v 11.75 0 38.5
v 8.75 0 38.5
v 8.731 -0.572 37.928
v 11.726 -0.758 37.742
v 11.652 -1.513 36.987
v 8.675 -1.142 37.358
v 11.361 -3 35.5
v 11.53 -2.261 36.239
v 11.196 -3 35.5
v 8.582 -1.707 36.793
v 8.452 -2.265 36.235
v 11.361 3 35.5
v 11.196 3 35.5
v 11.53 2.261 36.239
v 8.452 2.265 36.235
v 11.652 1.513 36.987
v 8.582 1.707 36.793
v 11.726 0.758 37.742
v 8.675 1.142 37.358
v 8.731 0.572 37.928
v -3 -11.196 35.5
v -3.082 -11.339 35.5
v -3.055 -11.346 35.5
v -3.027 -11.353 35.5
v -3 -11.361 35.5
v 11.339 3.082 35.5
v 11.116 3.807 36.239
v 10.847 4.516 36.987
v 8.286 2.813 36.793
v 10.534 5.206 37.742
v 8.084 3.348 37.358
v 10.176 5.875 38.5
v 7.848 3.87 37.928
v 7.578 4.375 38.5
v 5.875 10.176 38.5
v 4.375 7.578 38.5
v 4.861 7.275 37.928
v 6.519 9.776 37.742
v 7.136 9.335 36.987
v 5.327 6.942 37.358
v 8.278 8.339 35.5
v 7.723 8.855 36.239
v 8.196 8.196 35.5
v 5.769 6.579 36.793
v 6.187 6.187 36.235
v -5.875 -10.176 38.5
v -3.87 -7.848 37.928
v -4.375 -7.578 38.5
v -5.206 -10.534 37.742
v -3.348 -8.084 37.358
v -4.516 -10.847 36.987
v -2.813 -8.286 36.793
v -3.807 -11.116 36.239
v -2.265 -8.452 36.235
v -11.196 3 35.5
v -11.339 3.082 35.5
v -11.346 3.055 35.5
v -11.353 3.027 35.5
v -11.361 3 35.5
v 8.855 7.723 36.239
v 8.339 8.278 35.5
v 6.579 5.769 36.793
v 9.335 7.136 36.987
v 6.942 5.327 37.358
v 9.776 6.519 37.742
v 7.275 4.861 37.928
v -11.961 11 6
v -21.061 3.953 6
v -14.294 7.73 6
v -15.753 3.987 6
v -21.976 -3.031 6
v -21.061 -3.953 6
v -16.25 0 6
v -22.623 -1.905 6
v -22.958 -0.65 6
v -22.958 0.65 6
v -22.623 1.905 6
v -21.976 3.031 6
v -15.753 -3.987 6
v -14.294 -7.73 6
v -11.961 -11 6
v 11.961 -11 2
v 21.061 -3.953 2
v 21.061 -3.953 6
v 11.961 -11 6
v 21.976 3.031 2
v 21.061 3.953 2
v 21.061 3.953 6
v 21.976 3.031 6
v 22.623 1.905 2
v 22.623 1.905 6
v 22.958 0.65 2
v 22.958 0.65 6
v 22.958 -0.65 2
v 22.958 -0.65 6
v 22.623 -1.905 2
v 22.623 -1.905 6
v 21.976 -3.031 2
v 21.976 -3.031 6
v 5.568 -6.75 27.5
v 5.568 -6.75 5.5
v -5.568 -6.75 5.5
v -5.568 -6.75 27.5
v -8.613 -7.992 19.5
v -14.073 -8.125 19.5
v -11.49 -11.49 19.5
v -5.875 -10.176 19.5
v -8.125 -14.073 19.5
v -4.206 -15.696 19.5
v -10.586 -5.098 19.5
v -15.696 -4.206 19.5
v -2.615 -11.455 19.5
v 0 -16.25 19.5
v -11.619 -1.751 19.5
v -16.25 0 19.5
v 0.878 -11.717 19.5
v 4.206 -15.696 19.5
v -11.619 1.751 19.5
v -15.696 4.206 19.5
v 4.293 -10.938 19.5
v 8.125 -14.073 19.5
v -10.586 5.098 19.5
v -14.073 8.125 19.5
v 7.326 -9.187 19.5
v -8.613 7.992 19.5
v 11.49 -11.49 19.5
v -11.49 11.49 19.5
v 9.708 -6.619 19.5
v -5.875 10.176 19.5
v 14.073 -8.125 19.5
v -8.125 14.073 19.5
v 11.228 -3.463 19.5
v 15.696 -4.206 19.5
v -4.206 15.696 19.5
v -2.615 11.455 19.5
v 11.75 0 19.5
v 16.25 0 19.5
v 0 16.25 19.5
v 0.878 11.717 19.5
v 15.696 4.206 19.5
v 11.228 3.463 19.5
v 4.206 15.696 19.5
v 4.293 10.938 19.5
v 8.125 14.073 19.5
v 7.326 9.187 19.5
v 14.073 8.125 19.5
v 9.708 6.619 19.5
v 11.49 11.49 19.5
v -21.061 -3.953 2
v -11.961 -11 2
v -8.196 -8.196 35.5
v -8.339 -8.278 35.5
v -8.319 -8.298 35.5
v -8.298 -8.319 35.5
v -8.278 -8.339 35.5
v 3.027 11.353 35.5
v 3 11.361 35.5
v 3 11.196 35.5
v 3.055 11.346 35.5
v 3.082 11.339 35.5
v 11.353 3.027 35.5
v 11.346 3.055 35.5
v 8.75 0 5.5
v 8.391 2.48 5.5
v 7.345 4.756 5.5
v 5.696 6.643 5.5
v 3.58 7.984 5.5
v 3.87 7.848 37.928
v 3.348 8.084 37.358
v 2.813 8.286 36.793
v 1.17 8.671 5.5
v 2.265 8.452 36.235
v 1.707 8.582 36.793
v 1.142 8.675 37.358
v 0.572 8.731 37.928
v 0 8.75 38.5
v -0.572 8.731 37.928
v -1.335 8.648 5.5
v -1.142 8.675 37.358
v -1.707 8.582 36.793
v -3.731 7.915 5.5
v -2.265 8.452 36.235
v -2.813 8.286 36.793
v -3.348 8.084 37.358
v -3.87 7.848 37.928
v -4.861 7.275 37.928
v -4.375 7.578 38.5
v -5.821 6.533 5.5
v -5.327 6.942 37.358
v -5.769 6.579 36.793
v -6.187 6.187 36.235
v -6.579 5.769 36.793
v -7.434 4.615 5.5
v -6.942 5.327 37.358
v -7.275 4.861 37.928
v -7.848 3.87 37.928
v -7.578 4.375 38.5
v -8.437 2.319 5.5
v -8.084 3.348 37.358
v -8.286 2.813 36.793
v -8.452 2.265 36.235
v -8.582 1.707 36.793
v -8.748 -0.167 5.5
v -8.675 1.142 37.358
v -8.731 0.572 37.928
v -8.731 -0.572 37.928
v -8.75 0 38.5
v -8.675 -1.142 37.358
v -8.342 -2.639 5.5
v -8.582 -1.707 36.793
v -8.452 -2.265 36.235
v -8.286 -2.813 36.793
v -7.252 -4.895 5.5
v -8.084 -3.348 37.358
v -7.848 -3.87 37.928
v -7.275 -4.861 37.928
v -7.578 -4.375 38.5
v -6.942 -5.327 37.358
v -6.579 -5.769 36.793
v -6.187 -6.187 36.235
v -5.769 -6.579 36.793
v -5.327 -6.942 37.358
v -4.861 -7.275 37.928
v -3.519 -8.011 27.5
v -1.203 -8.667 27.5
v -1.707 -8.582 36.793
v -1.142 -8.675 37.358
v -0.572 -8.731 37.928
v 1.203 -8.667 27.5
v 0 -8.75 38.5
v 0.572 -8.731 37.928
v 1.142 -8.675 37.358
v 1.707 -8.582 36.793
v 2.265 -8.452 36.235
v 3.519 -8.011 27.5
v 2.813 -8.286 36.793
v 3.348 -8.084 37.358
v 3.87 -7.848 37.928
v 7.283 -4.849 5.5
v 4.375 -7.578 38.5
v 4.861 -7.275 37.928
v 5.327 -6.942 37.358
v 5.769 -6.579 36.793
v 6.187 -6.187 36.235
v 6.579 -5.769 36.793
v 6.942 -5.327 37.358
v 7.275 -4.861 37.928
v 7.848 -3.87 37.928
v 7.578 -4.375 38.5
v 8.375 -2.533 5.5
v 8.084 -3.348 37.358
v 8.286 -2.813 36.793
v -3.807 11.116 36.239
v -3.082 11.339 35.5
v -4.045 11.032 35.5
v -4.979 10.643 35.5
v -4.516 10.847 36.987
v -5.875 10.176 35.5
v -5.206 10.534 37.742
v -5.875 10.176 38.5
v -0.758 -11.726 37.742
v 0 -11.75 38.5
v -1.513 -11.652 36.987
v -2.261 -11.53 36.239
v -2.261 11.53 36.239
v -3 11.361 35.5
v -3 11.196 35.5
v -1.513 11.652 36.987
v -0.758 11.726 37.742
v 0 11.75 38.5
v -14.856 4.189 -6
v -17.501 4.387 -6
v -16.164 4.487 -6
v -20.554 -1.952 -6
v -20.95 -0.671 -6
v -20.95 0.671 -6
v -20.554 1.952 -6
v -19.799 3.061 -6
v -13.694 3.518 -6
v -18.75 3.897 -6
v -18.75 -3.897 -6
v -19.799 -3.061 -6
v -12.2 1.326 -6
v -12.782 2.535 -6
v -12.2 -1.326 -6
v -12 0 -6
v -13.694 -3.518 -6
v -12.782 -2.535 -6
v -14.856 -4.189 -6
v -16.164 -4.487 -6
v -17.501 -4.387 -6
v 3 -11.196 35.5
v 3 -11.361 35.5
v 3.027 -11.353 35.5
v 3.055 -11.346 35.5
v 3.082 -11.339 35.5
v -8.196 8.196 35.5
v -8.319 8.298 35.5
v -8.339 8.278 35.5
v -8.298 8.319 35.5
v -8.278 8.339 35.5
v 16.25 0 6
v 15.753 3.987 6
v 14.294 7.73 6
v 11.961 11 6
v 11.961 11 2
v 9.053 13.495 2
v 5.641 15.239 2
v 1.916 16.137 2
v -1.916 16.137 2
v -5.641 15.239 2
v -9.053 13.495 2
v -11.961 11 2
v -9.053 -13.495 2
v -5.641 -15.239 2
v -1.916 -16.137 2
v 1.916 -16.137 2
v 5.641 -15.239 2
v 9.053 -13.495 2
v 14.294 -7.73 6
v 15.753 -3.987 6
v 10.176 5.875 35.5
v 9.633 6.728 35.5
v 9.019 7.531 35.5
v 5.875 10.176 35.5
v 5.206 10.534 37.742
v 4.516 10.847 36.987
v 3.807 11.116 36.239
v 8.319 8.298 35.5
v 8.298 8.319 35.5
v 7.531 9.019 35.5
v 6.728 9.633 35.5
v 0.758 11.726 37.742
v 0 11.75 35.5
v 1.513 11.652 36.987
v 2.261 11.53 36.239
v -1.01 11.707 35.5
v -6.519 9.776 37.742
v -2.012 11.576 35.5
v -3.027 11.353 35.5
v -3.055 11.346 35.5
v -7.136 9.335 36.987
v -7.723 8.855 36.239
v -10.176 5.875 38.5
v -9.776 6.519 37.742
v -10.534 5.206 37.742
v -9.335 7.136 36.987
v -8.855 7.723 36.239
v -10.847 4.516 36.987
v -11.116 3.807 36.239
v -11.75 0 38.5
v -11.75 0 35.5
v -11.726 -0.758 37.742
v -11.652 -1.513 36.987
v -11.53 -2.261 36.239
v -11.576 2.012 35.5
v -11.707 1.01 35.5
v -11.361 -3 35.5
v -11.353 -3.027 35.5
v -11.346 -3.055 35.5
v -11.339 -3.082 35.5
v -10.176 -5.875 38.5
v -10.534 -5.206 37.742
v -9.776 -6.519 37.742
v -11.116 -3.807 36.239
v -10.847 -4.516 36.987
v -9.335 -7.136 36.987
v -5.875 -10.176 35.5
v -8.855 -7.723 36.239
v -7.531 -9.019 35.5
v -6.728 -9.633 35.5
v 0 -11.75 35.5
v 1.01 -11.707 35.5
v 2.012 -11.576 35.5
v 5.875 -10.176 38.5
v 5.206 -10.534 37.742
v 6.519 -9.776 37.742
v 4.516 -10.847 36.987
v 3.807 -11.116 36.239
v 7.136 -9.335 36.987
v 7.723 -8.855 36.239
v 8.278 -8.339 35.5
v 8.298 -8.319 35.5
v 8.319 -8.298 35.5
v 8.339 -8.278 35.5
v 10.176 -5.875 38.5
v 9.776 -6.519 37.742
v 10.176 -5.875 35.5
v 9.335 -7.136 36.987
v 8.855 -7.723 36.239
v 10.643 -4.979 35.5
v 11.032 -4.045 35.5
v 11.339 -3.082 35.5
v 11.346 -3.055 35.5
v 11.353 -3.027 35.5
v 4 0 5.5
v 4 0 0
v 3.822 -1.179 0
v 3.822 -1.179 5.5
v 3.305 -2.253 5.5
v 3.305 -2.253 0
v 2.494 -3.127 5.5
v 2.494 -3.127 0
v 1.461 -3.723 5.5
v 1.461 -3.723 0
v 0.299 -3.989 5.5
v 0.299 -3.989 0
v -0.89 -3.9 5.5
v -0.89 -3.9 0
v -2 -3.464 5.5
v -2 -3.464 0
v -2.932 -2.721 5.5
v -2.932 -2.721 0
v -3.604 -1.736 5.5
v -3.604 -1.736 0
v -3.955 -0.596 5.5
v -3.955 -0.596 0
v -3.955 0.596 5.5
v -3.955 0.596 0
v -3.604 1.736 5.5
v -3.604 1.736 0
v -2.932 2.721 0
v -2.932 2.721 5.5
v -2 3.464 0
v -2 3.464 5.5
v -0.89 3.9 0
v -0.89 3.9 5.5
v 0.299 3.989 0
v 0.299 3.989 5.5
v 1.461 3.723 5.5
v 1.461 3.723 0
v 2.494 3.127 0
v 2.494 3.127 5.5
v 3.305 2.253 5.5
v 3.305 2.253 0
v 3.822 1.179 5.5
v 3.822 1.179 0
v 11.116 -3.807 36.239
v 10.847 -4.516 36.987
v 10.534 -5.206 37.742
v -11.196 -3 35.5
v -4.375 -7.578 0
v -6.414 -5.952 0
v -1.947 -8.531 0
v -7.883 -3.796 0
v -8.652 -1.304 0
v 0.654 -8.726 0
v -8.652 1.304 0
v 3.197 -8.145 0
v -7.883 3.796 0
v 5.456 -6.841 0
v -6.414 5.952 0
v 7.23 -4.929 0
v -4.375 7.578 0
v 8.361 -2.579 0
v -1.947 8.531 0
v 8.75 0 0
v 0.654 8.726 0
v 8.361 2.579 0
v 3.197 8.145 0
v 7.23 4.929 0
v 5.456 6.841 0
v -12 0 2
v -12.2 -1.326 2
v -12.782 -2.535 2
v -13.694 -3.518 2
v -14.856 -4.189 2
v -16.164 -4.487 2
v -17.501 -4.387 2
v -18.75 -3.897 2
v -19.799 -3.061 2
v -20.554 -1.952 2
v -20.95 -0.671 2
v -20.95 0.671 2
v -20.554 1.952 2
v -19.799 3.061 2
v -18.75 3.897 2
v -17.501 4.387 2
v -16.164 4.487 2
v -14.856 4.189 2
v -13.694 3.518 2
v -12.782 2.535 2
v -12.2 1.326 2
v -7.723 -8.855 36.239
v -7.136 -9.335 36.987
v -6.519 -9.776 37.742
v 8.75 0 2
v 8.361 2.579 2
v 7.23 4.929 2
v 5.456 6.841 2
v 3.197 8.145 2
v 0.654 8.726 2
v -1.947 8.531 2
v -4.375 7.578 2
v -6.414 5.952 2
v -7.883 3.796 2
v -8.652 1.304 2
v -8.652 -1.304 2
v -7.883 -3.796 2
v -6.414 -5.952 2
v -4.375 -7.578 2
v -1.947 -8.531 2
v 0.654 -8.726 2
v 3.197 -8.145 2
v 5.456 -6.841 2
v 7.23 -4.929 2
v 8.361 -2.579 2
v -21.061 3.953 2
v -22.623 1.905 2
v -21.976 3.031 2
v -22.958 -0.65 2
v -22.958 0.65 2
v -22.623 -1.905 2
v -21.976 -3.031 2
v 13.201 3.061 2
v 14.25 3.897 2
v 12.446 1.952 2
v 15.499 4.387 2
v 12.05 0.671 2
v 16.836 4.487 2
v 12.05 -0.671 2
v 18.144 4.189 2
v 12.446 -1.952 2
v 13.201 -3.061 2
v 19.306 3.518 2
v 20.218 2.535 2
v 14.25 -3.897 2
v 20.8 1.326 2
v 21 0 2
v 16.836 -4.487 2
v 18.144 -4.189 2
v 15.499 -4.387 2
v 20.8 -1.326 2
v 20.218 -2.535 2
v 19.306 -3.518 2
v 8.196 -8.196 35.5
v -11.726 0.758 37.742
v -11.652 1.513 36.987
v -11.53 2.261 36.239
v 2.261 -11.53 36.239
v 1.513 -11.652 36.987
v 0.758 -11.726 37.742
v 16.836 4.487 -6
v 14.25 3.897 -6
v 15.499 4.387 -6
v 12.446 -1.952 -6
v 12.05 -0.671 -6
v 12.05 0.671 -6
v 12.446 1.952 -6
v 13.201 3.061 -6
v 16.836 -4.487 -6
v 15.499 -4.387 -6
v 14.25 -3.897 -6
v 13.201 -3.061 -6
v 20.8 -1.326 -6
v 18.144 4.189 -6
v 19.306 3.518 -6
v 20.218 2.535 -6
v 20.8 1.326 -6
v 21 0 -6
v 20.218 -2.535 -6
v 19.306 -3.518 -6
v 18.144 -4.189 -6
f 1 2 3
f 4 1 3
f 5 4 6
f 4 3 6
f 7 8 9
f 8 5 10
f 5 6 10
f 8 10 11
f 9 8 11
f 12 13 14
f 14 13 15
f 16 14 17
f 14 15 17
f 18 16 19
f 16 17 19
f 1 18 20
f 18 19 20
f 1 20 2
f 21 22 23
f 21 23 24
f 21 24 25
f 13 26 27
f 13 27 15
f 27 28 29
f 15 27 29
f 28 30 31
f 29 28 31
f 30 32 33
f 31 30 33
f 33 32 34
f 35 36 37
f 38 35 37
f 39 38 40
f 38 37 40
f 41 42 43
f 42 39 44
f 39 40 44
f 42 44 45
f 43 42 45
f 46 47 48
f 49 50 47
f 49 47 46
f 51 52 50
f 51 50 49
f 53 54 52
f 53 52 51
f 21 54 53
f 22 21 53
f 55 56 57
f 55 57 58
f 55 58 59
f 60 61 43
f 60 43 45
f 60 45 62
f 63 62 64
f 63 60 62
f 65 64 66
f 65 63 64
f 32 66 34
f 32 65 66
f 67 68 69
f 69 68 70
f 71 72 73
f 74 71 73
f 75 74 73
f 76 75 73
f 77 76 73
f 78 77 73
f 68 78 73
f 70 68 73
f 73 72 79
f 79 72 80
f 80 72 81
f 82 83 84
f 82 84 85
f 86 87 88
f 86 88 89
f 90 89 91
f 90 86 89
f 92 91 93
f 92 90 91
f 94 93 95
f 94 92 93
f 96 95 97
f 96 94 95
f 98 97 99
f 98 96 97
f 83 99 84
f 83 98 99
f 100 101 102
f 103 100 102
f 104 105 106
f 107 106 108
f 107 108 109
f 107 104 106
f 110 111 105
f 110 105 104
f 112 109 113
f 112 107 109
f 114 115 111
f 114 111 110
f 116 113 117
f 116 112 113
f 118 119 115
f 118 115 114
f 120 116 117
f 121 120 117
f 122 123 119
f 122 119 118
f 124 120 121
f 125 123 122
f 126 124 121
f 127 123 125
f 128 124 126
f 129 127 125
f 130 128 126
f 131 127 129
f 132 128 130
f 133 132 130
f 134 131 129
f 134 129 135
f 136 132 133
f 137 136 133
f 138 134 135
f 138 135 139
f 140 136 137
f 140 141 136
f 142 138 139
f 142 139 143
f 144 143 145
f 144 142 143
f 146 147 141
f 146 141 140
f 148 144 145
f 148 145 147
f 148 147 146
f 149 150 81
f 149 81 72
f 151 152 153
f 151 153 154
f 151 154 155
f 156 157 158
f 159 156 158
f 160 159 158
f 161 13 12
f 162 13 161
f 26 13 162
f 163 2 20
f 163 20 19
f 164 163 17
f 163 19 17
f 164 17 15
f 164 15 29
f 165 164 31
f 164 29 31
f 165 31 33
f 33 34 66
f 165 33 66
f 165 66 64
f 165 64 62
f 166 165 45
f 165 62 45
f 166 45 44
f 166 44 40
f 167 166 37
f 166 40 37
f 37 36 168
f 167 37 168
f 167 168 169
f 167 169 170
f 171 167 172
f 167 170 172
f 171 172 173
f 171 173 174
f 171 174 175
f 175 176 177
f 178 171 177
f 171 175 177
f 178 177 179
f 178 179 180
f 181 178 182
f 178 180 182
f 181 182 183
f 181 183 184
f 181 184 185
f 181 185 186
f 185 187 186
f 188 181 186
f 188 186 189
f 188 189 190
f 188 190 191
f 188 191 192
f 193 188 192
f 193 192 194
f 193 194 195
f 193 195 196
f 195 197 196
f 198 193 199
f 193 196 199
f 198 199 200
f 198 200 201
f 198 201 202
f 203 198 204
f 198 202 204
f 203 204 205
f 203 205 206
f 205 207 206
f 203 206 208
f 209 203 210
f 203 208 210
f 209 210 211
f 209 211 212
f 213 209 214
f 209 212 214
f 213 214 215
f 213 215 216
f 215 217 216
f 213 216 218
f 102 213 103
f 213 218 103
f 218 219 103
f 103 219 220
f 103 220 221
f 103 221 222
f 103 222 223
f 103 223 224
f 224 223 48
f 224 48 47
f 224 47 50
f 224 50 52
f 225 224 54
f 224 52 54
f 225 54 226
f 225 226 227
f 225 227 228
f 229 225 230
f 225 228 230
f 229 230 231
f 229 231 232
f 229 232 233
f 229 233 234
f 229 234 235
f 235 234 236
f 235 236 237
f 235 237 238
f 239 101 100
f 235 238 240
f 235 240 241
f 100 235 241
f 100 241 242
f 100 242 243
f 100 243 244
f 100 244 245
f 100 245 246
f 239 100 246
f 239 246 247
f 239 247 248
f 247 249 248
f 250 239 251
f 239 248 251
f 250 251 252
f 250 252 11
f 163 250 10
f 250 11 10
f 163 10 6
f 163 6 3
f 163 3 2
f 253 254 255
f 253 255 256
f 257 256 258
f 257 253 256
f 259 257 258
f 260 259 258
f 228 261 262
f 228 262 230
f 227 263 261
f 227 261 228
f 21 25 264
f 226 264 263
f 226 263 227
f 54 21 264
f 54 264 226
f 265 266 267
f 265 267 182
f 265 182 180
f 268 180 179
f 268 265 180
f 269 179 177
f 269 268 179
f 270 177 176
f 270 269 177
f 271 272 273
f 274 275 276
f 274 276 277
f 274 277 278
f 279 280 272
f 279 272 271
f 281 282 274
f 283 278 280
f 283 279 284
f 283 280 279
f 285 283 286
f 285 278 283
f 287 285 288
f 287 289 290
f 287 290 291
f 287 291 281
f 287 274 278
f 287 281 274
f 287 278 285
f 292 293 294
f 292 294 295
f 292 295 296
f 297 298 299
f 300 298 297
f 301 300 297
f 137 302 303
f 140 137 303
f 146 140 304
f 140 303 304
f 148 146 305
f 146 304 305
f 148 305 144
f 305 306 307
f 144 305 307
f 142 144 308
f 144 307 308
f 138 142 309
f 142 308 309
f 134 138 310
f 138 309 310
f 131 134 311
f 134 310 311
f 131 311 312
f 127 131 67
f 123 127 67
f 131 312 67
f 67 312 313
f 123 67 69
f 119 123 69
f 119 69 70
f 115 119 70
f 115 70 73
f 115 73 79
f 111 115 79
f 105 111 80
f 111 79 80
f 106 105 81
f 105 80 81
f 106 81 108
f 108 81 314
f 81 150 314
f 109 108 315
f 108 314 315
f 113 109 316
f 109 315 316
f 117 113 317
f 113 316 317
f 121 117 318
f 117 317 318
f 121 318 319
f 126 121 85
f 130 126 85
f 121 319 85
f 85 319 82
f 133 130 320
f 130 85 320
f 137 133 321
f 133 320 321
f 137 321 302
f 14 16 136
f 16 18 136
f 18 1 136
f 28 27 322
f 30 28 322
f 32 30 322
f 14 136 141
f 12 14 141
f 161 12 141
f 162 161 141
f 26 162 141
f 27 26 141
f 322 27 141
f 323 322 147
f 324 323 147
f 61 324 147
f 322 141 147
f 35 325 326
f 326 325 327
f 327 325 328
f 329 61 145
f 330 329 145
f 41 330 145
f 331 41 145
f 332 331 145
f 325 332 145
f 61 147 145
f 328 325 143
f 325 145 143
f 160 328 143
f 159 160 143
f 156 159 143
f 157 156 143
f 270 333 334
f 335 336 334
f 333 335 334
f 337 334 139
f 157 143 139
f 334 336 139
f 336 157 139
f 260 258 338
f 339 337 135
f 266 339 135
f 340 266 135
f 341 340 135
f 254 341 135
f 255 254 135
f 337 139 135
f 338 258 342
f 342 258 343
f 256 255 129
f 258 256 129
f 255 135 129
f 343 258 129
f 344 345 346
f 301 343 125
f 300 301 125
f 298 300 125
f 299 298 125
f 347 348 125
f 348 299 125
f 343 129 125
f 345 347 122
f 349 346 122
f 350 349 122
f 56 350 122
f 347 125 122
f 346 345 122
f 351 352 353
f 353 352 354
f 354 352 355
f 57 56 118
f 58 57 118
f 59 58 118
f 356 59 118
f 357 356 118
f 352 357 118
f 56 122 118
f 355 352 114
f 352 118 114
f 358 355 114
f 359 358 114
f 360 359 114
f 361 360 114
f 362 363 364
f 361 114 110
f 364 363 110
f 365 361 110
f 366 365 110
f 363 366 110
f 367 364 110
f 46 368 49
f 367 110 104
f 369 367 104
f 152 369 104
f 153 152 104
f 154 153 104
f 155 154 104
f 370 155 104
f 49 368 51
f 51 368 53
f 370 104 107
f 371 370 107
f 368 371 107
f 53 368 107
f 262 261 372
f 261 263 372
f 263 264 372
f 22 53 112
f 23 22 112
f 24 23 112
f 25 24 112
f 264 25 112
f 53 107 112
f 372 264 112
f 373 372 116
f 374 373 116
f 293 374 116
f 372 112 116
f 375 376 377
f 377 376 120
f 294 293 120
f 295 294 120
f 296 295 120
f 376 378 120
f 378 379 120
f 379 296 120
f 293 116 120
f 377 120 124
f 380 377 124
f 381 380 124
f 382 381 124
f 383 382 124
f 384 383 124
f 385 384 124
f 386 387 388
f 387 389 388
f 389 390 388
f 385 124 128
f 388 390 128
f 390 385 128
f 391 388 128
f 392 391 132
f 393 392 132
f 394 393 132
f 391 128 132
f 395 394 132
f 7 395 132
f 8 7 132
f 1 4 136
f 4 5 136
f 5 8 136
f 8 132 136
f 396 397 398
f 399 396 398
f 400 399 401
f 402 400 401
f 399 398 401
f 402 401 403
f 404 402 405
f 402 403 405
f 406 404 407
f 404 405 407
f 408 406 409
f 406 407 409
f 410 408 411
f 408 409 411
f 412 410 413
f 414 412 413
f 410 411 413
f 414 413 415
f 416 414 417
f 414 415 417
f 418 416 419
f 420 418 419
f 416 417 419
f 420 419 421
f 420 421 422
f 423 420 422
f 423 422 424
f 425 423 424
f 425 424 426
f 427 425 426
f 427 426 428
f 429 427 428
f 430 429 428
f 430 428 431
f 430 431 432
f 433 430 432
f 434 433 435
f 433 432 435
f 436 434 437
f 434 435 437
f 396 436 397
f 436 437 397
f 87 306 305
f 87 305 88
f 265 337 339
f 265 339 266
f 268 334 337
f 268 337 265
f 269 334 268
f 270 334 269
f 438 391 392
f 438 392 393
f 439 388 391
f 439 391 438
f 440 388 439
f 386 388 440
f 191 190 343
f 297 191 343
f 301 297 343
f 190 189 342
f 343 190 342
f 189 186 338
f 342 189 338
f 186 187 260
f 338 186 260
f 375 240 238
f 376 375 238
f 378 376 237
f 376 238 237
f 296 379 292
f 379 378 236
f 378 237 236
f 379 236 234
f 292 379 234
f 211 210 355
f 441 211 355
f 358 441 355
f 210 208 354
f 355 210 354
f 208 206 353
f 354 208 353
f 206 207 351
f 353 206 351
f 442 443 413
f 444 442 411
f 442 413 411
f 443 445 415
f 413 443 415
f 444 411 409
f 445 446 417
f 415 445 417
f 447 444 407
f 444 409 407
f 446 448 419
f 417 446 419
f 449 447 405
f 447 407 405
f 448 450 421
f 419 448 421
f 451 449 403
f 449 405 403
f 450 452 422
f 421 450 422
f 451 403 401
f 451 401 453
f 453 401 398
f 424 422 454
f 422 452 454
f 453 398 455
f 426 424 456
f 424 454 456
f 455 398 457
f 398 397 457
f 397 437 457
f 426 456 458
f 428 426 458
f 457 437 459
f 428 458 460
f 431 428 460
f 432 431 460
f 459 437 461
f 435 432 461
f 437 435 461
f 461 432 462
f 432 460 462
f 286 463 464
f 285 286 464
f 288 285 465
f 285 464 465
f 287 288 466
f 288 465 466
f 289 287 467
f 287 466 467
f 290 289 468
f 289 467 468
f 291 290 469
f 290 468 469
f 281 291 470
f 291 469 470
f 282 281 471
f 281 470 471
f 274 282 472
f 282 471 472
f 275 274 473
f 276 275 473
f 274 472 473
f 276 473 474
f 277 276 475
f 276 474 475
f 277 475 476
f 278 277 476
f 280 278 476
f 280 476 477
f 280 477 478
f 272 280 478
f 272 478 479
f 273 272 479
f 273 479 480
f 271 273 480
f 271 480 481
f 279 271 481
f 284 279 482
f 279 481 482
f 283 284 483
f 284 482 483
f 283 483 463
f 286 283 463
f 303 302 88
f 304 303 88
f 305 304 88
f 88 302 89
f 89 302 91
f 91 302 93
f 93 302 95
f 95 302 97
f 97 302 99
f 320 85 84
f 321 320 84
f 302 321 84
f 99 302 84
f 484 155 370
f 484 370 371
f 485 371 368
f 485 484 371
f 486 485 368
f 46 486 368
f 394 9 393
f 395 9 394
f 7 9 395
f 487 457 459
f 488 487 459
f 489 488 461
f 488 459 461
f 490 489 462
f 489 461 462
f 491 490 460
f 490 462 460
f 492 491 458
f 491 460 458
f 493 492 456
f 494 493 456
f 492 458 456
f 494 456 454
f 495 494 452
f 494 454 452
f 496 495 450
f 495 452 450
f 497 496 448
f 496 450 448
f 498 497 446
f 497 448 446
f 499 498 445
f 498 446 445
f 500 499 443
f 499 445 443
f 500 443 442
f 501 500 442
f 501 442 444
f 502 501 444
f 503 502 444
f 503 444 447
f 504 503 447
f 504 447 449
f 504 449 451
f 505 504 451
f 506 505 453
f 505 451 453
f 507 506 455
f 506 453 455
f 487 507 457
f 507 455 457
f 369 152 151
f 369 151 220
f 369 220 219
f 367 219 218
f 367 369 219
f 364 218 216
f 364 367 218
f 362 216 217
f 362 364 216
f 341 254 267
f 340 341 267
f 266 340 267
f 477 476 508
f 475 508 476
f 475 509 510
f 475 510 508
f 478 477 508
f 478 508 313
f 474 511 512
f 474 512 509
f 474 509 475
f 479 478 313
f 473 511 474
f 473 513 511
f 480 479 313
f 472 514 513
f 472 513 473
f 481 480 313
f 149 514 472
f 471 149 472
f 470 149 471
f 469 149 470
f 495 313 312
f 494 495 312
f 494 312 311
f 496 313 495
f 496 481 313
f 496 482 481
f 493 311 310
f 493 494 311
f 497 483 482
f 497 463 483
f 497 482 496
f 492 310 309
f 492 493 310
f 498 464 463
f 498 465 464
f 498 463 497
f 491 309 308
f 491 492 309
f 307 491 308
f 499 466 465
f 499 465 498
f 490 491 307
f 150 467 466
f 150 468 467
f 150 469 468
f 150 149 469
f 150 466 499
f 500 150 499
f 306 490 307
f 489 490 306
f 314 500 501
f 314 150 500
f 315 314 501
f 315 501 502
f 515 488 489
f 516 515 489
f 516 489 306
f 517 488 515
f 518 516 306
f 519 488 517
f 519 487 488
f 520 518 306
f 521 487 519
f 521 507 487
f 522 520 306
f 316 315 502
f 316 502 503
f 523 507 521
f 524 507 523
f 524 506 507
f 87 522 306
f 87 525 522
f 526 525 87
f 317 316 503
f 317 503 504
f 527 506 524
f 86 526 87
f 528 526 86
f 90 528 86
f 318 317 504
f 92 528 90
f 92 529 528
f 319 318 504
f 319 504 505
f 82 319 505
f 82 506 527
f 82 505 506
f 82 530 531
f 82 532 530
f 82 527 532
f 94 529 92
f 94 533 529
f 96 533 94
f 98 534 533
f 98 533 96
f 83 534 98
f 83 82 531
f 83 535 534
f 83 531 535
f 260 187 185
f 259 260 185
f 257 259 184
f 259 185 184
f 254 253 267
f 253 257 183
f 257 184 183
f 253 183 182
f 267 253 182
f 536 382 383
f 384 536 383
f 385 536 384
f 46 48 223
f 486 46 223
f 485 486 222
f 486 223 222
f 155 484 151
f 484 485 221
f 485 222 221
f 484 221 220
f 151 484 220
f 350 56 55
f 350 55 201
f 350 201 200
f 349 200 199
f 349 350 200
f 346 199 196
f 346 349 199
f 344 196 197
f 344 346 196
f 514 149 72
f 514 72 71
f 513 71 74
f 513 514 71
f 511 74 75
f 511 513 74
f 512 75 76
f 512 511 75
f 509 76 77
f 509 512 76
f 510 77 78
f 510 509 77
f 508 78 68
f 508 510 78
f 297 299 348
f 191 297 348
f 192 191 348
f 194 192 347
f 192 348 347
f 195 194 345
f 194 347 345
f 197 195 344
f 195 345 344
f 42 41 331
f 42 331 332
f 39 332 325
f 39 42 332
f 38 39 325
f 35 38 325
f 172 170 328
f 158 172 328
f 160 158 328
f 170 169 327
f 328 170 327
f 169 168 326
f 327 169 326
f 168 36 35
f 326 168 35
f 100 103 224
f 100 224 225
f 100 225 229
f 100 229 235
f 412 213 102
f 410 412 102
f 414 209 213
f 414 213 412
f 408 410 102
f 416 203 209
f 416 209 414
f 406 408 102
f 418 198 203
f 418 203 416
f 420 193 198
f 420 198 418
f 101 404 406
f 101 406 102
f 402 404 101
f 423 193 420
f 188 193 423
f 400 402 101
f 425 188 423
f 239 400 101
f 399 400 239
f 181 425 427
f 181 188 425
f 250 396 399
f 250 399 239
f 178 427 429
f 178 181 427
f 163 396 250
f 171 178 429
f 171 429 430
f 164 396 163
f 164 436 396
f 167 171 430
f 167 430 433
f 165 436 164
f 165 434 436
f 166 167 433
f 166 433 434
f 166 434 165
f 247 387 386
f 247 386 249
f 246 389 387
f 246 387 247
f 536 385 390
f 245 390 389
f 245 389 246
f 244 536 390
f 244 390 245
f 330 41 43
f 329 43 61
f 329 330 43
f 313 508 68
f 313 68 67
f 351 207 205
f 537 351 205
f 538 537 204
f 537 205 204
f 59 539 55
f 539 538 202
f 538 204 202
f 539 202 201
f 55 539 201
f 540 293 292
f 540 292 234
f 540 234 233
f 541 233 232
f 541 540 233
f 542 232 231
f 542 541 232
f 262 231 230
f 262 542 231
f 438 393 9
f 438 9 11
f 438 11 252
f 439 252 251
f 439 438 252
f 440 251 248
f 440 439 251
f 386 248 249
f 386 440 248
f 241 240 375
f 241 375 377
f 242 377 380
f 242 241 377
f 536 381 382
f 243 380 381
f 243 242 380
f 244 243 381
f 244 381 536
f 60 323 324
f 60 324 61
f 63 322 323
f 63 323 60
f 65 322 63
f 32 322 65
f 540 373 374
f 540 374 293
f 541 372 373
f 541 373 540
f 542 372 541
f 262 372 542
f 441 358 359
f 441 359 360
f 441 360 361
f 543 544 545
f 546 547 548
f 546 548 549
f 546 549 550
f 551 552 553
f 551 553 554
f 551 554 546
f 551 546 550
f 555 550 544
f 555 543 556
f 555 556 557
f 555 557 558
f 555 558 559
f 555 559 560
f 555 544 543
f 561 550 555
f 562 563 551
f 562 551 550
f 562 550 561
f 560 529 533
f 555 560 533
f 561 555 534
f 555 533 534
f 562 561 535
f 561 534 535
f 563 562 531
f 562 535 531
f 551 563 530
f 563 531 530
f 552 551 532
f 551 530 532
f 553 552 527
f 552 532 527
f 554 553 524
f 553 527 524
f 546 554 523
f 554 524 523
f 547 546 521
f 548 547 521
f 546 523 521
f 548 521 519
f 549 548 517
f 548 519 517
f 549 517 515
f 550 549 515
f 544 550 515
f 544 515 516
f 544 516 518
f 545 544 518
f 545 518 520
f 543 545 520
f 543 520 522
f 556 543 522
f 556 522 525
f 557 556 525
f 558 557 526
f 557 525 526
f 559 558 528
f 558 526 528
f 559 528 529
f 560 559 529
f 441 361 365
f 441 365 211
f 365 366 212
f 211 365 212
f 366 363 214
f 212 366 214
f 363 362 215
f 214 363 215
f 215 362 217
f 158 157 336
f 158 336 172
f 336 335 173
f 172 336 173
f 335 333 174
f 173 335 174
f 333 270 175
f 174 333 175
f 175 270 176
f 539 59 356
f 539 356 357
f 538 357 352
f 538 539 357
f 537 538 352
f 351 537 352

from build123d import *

# Parameters (mm, degrees)
F0_R          = 8.75
F1_DEPTH      = 2
F2_R          = 16.25
F3_DEPTH      = 17.5
F4_R          = 11.75
F5_DEPTH      = 19
F6_R          = 8.75
F7_DEPTH      = 33
F8_R          = 4
F9_DEPTH      = 5.5
F11_DEPTH     = 4
F12_R         = 4.5
F13_DEPTH     = 8
F15_DEPTH     = 22
F17_DEPTH     = 3
F18_SIZE      = 2.99999
F19_SIZE      = 2.99999
F20_DEPTH     = 3
F21_SIZE      = 2.99999
F22_T4_DEPTH  = 18.4300979278
F22_S5_R      = 11.75
F22_T6_DEPTH  = 11
F22_S7_R      = 8.75
F22_T8_DEPTH  = 11
F22_T13_DEPTH = 18.4300979278
F22_S14_R     = 11.75
F22_T15_DEPTH = 12
F22_S17_R     = 8.75
F22_T18_DEPTH = 12
F22_T22_DEPTH = 18.4300979278
F22_S23_R     = 11.75
F22_T24_DEPTH = 12
F22_S25_R     = 8.75
F22_T26_DEPTH = 12
F23_SIZE      = 2.99999
F24_SIZE      = 2.99999
F25_DEPTH     = 3
F26_T4_DEPTH  = 18.4300979278
F26_S5_R      = 11.75
F26_T6_DEPTH  = 12
F26_S7_R      = 8.75
F26_T8_DEPTH  = 12
F26_T12_DEPTH = 18.4300979278
F26_S13_R     = 11.75
F26_T14_DEPTH = 12
F26_S15_R     = 8.75
F26_T16_DEPTH = 12
F26_T20_DEPTH = 18.4300979278
F26_S21_R     = 11.75
F26_T22_DEPTH = 12
F26_S23_R     = 8.75
F26_T24_DEPTH = 12
F26_T28_DEPTH = 18.4300979278
F26_S29_R     = 11.75
F26_T30_DEPTH = 11
F26_S31_R     = 8.75
F26_T32_DEPTH = 11
F26_T36_DEPTH = 18.4300979278
F26_S37_R     = 11.75
F26_T38_DEPTH = 11
F26_S39_R     = 8.75
F26_T40_DEPTH = 11
F26_T44_DEPTH = 18.4300979278
F26_S45_R     = 11.75
F26_T46_DEPTH = 12
F26_S47_R     = 8.75
F26_T48_DEPTH = 12
F26_T52_DEPTH = 18.4300979278
F26_S53_R     = 11.75
F26_T54_DEPTH = 12
F26_S55_R     = 8.75
F26_T56_DEPTH = 12
F26_T60_DEPTH = 18.4300979278
F26_S61_R     = 11.75
F26_T62_DEPTH = 11
F26_S63_R     = 8.75
F26_T64_DEPTH = 11
F26_T68_DEPTH = 18.4300979278
F26_S69_R     = 11.75
F26_T70_DEPTH = 12
F26_S71_R     = 8.75
F26_T72_DEPTH = 12
F26_T76_DEPTH = 18.4300979278
F26_S77_R     = 11.75
F26_T78_DEPTH = 11
F26_S79_R     = 8.75
F26_T80_DEPTH = 11
F26_T84_DEPTH = 18.4300979278
F26_S85_R     = 11.75
F26_T86_DEPTH = 12
F26_S87_R     = 8.75
F26_T88_DEPTH = 12
F26_T92_DEPTH = 18.4300979278
F26_S93_R     = 11.75
F26_T94_DEPTH = 12
F26_S95_R     = 8.75
F26_T96_DEPTH = 12


# Not quite as in the source:
# - a fillet or chamfer that OpenCascade refuses, or shapes differently, is made with other operations: its cross-section is extruded or revolved along the edge and cut away or added
# - a fillet or chamfer is up to 0.001 mm smaller than in the source, because OpenCascade refuses the exact size


with BuildPart() as f1:
    # F0 (on Top) → F1 (new body)
    with BuildSketch(Plane.XY):
        Circle(F0_R)
    extrude(amount=F1_DEPTH)

    # F2 (on face) → F3 (join)
    with BuildSketch(Plane.XY.offset(2)):
        Circle(F2_R)
    extrude(amount=F3_DEPTH)

    # F4 (on face) → F5 (join)
    with BuildSketch(Plane.XY.offset(19.5)):
        Circle(F4_R)
    extrude(amount=F5_DEPTH)

    # F6 (on face) → F7 (cut)
    with BuildSketch(Plane.XY.offset(38.5)):
        Circle(F6_R)
    extrude(amount=-F7_DEPTH, mode=Mode.SUBTRACT)

    # F8 (on face) → F9 (cut, through all)
    with BuildSketch(Plane(origin=(0, 0, 0), x_dir=(1, 0, 0), z_dir=(0, 0, -1))):
        Circle(F8_R)
    extrude(amount=-F9_DEPTH, mode=Mode.SUBTRACT)

    # F10 (on face) → F11 (join)
    with BuildSketch(Plane(origin=(0, 0, 2), x_dir=(1, 0, 0), z_dir=(0, 0, -1))):
        with BuildLine():
            ThreePointArc((-11.9608737139, -11), (-16.25, 0), (-11.9608737139, 11))
            Line((-11.9608737139, 11), (-21.0611990106, 3.9533606738))
            ThreePointArc((-21.0611990106, 3.9533606738), (-23, 0), (-21.0611990106, -3.9533606738))
            Line((-21.0611990106, -3.9533606738), (-11.9608737139, -11))
        make_face()
        with BuildLine():
            Line((21.0611990106, 3.9533606738), (11.9608737139, 11))
            ThreePointArc((11.9608737139, 11), (15.1397935562, 5.9033169553), (16.25, 0))
            ThreePointArc((16.25, 0), (15.1397935562, -5.9033169553), (11.9608737139, -11))
            Line((11.9608737139, -11), (21.0611990106, -3.9533606738))
            ThreePointArc((21.0611990106, -3.9533606738), (23, 0), (21.0611990106, 3.9533606738))
        make_face()
    extrude(amount=-F11_DEPTH)

    # F12 (on face) → F13 (join)
    with BuildSketch(Plane(origin=(0, 0, 2), x_dir=(1, 0, 0), z_dir=(0, 0, -1))):
        with Locations((-16.5, 0)):
            Circle(F12_R)
        with Locations((16.5, 0)):
            Circle(F12_R)
    extrude(amount=F13_DEPTH)

    # F14 (on face) → F15 (join)
    with BuildSketch(Plane.XY.offset(5.5)):
        with BuildLine():
            Line((5.5677643628, -6.75), (-5.5677643628, -6.75))
            ThreePointArc((-5.5677643628, -6.75), (0, -8.75), (5.5677643628, -6.75))
        make_face()
    extrude(amount=F15_DEPTH)

    # F16 (on face) → F17 (cut)
    with BuildSketch(Plane.XY.offset(38.5)):
        with BuildLine():
            ThreePointArc((-7.5777222831, -4.375), (-8.45185098, -2.2646666446), (-8.75, 0))
            Line((-8.75, 0), (-11.75, 0))
            ThreePointArc((-11.75, 0), (-11.3496284589, -3.04112378), (-10.1757984945, -5.875))
            Line((-10.1757984945, -5.875), (-7.5777222831, -4.375))
        make_face()
    extrude(amount=-F17_DEPTH, mode=Mode.SUBTRACT)

    # F18 (size 3 in the source; OpenCascade refuses exactly that, so slightly less here)
    f18_edges = [f1.edges().sort_by_distance(p)[0] for p in [
        (-10.25, 0, 35.5),
    ]]
    chamfer(f18_edges, length=F18_SIZE)

    # F19 (size 3 in the source; OpenCascade refuses exactly that, so slightly less here)
    f19_edges = [f1.edges().sort_by_distance(p)[0] for p in [
        (-8.87676, -5.125, 35.5),
    ]]
    chamfer(f19_edges, length=F19_SIZE)

    # F16 (on face) → F20 (cut)
    with BuildSketch(Plane.XY.offset(38.5)):
        with BuildLine():
            Line((-10.1757984945, 5.875), (-7.5777222831, 4.375))
            ThreePointArc((-7.5777222831, 4.375), (-6.1871843354, 6.1871843354), (-4.375, 7.5777222831))
            Line((-4.375, 7.5777222831), (-5.875, 10.1757984945))
            ThreePointArc((-5.875, 10.1757984945), (-8.3085046789, 8.3085046789), (-10.1757984945, 5.875))
        make_face()
        with BuildLine():
            Line((0, 11.75), (0, 8.75))
            ThreePointArc((0, 8.75), (2.2646666446, 8.45185098), (4.375, 7.5777222831))
            Line((4.375, 7.5777222831), (5.875, 10.1757984945))
            ThreePointArc((5.875, 10.1757984945), (3.04112378, 11.3496284589), (0, 11.75))
        make_face()
        with BuildLine():
            Line((10.1757984945, 5.875), (7.5777222831, 4.375))
            ThreePointArc((7.5777222831, 4.375), (8.45185098, 2.2646666446), (8.75, 0))
            Line((8.75, 0), (11.75, 0))
            ThreePointArc((11.75, 0), (11.3496284589, 3.04112378), (10.1757984945, 5.875))
        make_face()
        with BuildLine():
            ThreePointArc((7.5777222831, -4.375), (6.1871843354, -6.1871843354), (4.375, -7.5777222831))
            Line((4.375, -7.5777222831), (5.875, -10.1757984945))
            ThreePointArc((5.875, -10.1757984945), (8.3085046789, -8.3085046789), (10.1757984945, -5.875))
            Line((10.1757984945, -5.875), (7.5777222831, -4.375))
        make_face()
        with BuildLine():
            ThreePointArc((0, -8.75), (-2.2646666446, -8.45185098), (-4.375, -7.5777222831))
            Line((-4.375, -7.5777222831), (-5.875, -10.1757984945))
            ThreePointArc((-5.875, -10.1757984945), (-3.04112378, -11.3496284589), (0, -11.75))
            Line((0, -11.75), (0, -8.75))
        make_face()
    extrude(amount=-F20_DEPTH, mode=Mode.SUBTRACT)

    # F21 (size 3 in the source; OpenCascade refuses exactly that, so slightly less here)
    f21_edges = [f1.edges().sort_by_distance(p)[0] for p in [
        (5.125, 8.87676, 35.5),
        (8.87676, -5.125, 35.5),
        (0, -10.25, 35.5),
        (-5.125, 8.87676, 35.5),
    ]]
    chamfer(f21_edges, length=F21_SIZE)

    # F22: chamfer of 3 on 3 edges, made by hand


with BuildPart() as f22_tool2:
    # F22_s3 → F22_t4 (new body)
    with BuildSketch(Plane.YZ.offset(1.0349510361)):
        Polygon((3, 35.5), (0, 38.5), (0, 35.5), align=None)
    extrude(amount=F22_T4_DEPTH)

    # F22_s5 → F22_t6 (intersect, symmetric)
    with BuildSketch(Plane.XY.offset(37)):
        Circle(F22_S5_R)
    extrude(amount=F22_T6_DEPTH, both=True, mode=Mode.INTERSECT)

    # F22_s7 → F22_t8 (cut, symmetric)
    with BuildSketch(Plane.XY.offset(37)):
        Circle(F22_S7_R)
    extrude(amount=F22_T8_DEPTH, both=True, mode=Mode.SUBTRACT)

    split(bisect_by=Plane.XY.offset(38.5), keep=Keep.BOTTOM)


with BuildPart() as f1_1:
    add(f1.part)

    # F22_t1: union F22_tool2
    add(f22_tool2.part)


with BuildPart() as f22_tool11:
    # F22_s12 → F22_t13 (new body)
    with BuildSketch(Plane(origin=(0.5174755181, -0.8962938889, 0), x_dir=(0, 0, 1), z_dir=(0.5, -0.8660254038, 0))):
        Polygon((38.5, 0), (35.5, -3), (35.5, 0), align=None)
    extrude(amount=F22_T13_DEPTH)

    # F22_s14 → F22_t15 (intersect, symmetric)
    with BuildSketch(Plane.XY.offset(37)):
        Circle(F22_S14_R)
    extrude(amount=F22_T15_DEPTH, both=True, mode=Mode.INTERSECT)

    split(bisect_by=Plane.XY.offset(38.5), keep=Keep.BOTTOM)

    # F22_s17 → F22_t18 (cut, symmetric)
    with BuildSketch(Plane.XY.offset(37)):
        Circle(F22_S17_R)
    extrude(amount=F22_T18_DEPTH, both=True, mode=Mode.SUBTRACT)


with BuildPart() as f1_2:
    add(f1_1.part)

    # F22_t10: union F22_tool11
    add(f22_tool11.part)


with BuildPart() as f22_tool20:
    # F22_s21 → F22_t22 (new body)
    with BuildSketch(Plane(origin=(-16.8572268886, 9.7325244819, 0), x_dir=(0, 0, 1), z_dir=(0.8660254038, -0.5, 0))):
        Polygon((35.5, -3), (38.5, 0), (35.5, 0), align=None)
    extrude(amount=F22_T22_DEPTH)

    # F22_s23 → F22_t24 (intersect, symmetric)
    with BuildSketch(Plane.XY.offset(37)):
        Circle(F22_S23_R)
    extrude(amount=F22_T24_DEPTH, both=True, mode=Mode.INTERSECT)

    # F22_s25 → F22_t26 (cut, symmetric)
    with BuildSketch(Plane.XY.offset(37)):
        Circle(F22_S25_R)
    extrude(amount=F22_T26_DEPTH, both=True, mode=Mode.SUBTRACT)

    split(bisect_by=Plane.XY.offset(38.5), keep=Keep.BOTTOM)


with BuildPart() as f1_3:
    add(f1_2.part)

    # F22_t19: union F22_tool20
    add(f22_tool20.part)

    # F23 (size 3 in the source; OpenCascade refuses exactly that, so slightly less here)
    f23_edges = [f1_3.edges().sort_by_distance(p)[0] for p in [
        (0, 10.25, 35.5),
        (8.87676, 5.125, 35.5),
    ]]
    chamfer(f23_edges, length=F23_SIZE)

    # F24 (size 3 in the source; OpenCascade refuses exactly that, so slightly less here)
    f24_edges = [f1_3.edges().sort_by_distance(p)[0] for p in [
        (-5.125, -8.87676, 35.5),
    ]]
    chamfer(f24_edges, length=F24_SIZE)

    # F25 (cut): faces of the model
    f25_faces = [f1_3.faces().sort_by_distance(p)[0] for p in [
        (-7.2164850483, -7.2164850483, 38.5),
        (2.6414168537, -9.857901902, 38.5),
        (9.857901902, -2.6414168537, 38.5),
        (7.2164850483, 7.2164850483, 38.5),
        (-2.6414168537, 9.857901902, 38.5),
        (-9.857901902, 2.6414168537, 38.5),
    ]]
    extrude(f25_faces, amount=-F25_DEPTH, mode=Mode.SUBTRACT)

    # F26: chamfer of 3 on 12 edges, made by hand


with BuildPart() as f26_tool2:
    # F26_s3 → F26_t4 (new body)
    with BuildSketch(Plane(origin=(-16.8572268886, 9.7325244819, 0), x_dir=(0, 0, 1), z_dir=(0.8660254038, -0.5, 0))):
        Polygon((35.5, 3), (38.5, 0), (35.5, 0), align=None)
    extrude(amount=F26_T4_DEPTH)

    # F26_s5 → F26_t6 (intersect, symmetric)
    with BuildSketch(Plane.XY.offset(37)):
        Circle(F26_S5_R)
    extrude(amount=F26_T6_DEPTH, both=True, mode=Mode.INTERSECT)

    # F26_s7 → F26_t8 (cut, symmetric)
    with BuildSketch(Plane.XY.offset(37)):
        Circle(F26_S7_R)
    extrude(amount=F26_T8_DEPTH, both=True, mode=Mode.SUBTRACT)


with BuildPart() as f1_4:
    add(f1_3.part)

    # F26_t1: union F26_tool2
    add(f26_tool2.part)


with BuildPart() as f26_tool10:
    # F26_s11 → F26_t12 (new body)
    with BuildSketch(Plane(origin=(-16.8572268886, -9.7325244819, 0), x_dir=(0, 0, 1), z_dir=(0.8660254038, 0.5, 0))):
        Polygon((35.5, 3), (38.5, 0), (35.5, 0), align=None)
    extrude(amount=F26_T12_DEPTH)

    # F26_s13 → F26_t14 (intersect, symmetric)
    with BuildSketch(Plane.XY.offset(37)):
        Circle(F26_S13_R)
    extrude(amount=F26_T14_DEPTH, both=True, mode=Mode.INTERSECT)

    # F26_s15 → F26_t16 (cut, symmetric)
    with BuildSketch(Plane.XY.offset(37)):
        Circle(F26_S15_R)
    extrude(amount=F26_T16_DEPTH, both=True, mode=Mode.SUBTRACT)


with BuildPart() as f1_5:
    add(f1_4.part)

    # F26_t9: union F26_tool10
    add(f26_tool10.part)


with BuildPart() as f26_tool18:
    # F26_s19 → F26_t20 (new body)
    with BuildSketch(Plane(origin=(0.5174755181, -0.8962938889, 0), x_dir=(0, 0, 1), z_dir=(0.5, -0.8660254038, 0))):
        Polygon((38.5, 0), (35.5, 3), (35.5, 0), align=None)
    extrude(amount=F26_T20_DEPTH)

    # F26_s21 → F26_t22 (intersect, symmetric)
    with BuildSketch(Plane.XY.offset(37)):
        Circle(F26_S21_R)
    extrude(amount=F26_T22_DEPTH, both=True, mode=Mode.INTERSECT)

    # F26_s23 → F26_t24 (cut, symmetric)
    with BuildSketch(Plane.XY.offset(37)):
        Circle(F26_S23_R)
    extrude(amount=F26_T24_DEPTH, both=True, mode=Mode.SUBTRACT)


with BuildPart() as f1_6:
    add(f1_5.part)

    # F26_t17: union F26_tool18
    add(f26_tool18.part)


with BuildPart() as f26_tool26:
    # F26_s27 → F26_t28 (new body)
    with BuildSketch(Plane.YZ.offset(1.0349510361)):
        Polygon((0, 38.5), (-3, 35.5), (0, 35.5), align=None)
    extrude(amount=F26_T28_DEPTH)

    # F26_s29 → F26_t30 (intersect, symmetric)
    with BuildSketch(Plane.XY.offset(37)):
        Circle(F26_S29_R)
    extrude(amount=F26_T30_DEPTH, both=True, mode=Mode.INTERSECT)

    # F26_s31 → F26_t32 (cut, symmetric)
    with BuildSketch(Plane.XY.offset(37)):
        Circle(F26_S31_R)
    extrude(amount=F26_T32_DEPTH, both=True, mode=Mode.SUBTRACT)


with BuildPart() as f1_7:
    add(f1_6.part)

    # F26_t25: union F26_tool26
    add(f26_tool26.part)


with BuildPart() as f26_tool34:
    # F26_s35 → F26_t36 (new body)
    with BuildSketch(Plane.XZ.offset(-19.4650489639)):
        Polygon((-3, 35.5), (0, 38.5), (0, 35.5), align=None)
    extrude(amount=F26_T36_DEPTH)

    # F26_s37 → F26_t38 (intersect, symmetric)
    with BuildSketch(Plane.XY.offset(37)):
        Circle(F26_S37_R)
    extrude(amount=F26_T38_DEPTH, both=True, mode=Mode.INTERSECT)

    # F26_s39 → F26_t40 (cut, symmetric)
    with BuildSketch(Plane.XY.offset(37)):
        Circle(F26_S39_R)
    extrude(amount=F26_T40_DEPTH, both=True, mode=Mode.SUBTRACT)


with BuildPart() as f1_8:
    add(f1_7.part)

    # F26_t33: union F26_tool34
    add(f26_tool34.part)


with BuildPart() as f26_tool42:
    # F26_s43 → F26_t44 (new body)
    with BuildSketch(Plane(origin=(16.8572268886, 9.7325244819, 0), x_dir=(0, 0, 1), z_dir=(-0.8660254038, -0.5, 0))):
        Polygon((35.5, 3), (38.5, 0), (35.5, 0), align=None)
    extrude(amount=F26_T44_DEPTH)

    # F26_s45 → F26_t46 (intersect, symmetric)
    with BuildSketch(Plane.XY.offset(37)):
        Circle(F26_S45_R)
    extrude(amount=F26_T46_DEPTH, both=True, mode=Mode.INTERSECT)

    # F26_s47 → F26_t48 (cut, symmetric)
    with BuildSketch(Plane.XY.offset(37)):
        Circle(F26_S47_R)
    extrude(amount=F26_T48_DEPTH, both=True, mode=Mode.SUBTRACT)


with BuildPart() as f1_9:
    add(f1_8.part)

    # F26_t41: union F26_tool42
    add(f26_tool42.part)


with BuildPart() as f26_tool50:
    # F26_s51 → F26_t52 (new body)
    with BuildSketch(Plane(origin=(-0.5174755181, -0.8962938889, 0), x_dir=(0, 0, 1), z_dir=(-0.5, -0.8660254038, 0))):
        Polygon((38.5, 0), (35.5, 3), (35.5, 0), align=None)
    extrude(amount=F26_T52_DEPTH)

    # F26_s53 → F26_t54 (intersect, symmetric)
    with BuildSketch(Plane.XY.offset(37)):
        Circle(F26_S53_R)
    extrude(amount=F26_T54_DEPTH, both=True, mode=Mode.INTERSECT)

    # F26_s55 → F26_t56 (cut, symmetric)
    with BuildSketch(Plane.XY.offset(37)):
        Circle(F26_S55_R)
    extrude(amount=F26_T56_DEPTH, both=True, mode=Mode.SUBTRACT)


with BuildPart() as f1_10:
    add(f1_9.part)

    # F26_t49: union F26_tool50
    add(f26_tool50.part)


with BuildPart() as f26_tool58:
    # F26_s59 → F26_t60 (new body)
    with BuildSketch(Plane.YZ.offset(-1.0349510361)):
        Polygon((0, 38.5), (3, 35.5), (0, 35.5), align=None)
    extrude(amount=-F26_T60_DEPTH)

    # F26_s61 → F26_t62 (intersect, symmetric)
    with BuildSketch(Plane.XY.offset(37)):
        Circle(F26_S61_R)
    extrude(amount=F26_T62_DEPTH, both=True, mode=Mode.INTERSECT)

    # F26_s63 → F26_t64 (cut, symmetric)
    with BuildSketch(Plane.XY.offset(37)):
        Circle(F26_S63_R)
    extrude(amount=F26_T64_DEPTH, both=True, mode=Mode.SUBTRACT)


with BuildPart() as f1_11:
    add(f1_10.part)

    # F26_t57: union F26_tool58
    add(f26_tool58.part)


with BuildPart() as f26_tool66:
    # F26_s67 → F26_t68 (new body)
    with BuildSketch(Plane(origin=(16.8572268886, -9.7325244819, 0), x_dir=(0, 0, 1), z_dir=(-0.8660254038, 0.5, 0))):
        Polygon((35.5, 3), (38.5, 0), (35.5, 0), align=None)
    extrude(amount=F26_T68_DEPTH)

    # F26_s69 → F26_t70 (intersect, symmetric)
    with BuildSketch(Plane.XY.offset(37)):
        Circle(F26_S69_R)
    extrude(amount=F26_T70_DEPTH, both=True, mode=Mode.INTERSECT)

    # F26_s71 → F26_t72 (cut, symmetric)
    with BuildSketch(Plane.XY.offset(37)):
        Circle(F26_S71_R)
    extrude(amount=F26_T72_DEPTH, both=True, mode=Mode.SUBTRACT)


with BuildPart() as f1_12:
    add(f1_11.part)

    # F26_t65: union F26_tool66
    add(f26_tool66.part)


with BuildPart() as f26_tool74:
    # F26_s75 → F26_t76 (new body)
    with BuildSketch(Plane.XZ.offset(19.4650489639)):
        Polygon((3, 35.5), (0, 38.5), (0, 35.5), align=None)
    extrude(amount=-F26_T76_DEPTH)

    # F26_s77 → F26_t78 (intersect, symmetric)
    with BuildSketch(Plane.XY.offset(37)):
        Circle(F26_S77_R)
    extrude(amount=F26_T78_DEPTH, both=True, mode=Mode.INTERSECT)

    # F26_s79 → F26_t80 (cut, symmetric)
    with BuildSketch(Plane.XY.offset(37)):
        Circle(F26_S79_R)
    extrude(amount=F26_T80_DEPTH, both=True, mode=Mode.SUBTRACT)


with BuildPart() as f1_13:
    add(f1_12.part)

    # F26_t73: union F26_tool74
    add(f26_tool74.part)


with BuildPart() as f26_tool82:
    # F26_s83 → F26_t84 (new body)
    with BuildSketch(Plane(origin=(-0.5174755181, 0.8962938889, 0), x_dir=(0, 0, 1), z_dir=(-0.5, 0.8660254038, 0))):
        Polygon((38.5, 0), (35.5, 3), (35.5, 0), align=None)
    extrude(amount=F26_T84_DEPTH)

    # F26_s85 → F26_t86 (intersect, symmetric)
    with BuildSketch(Plane.XY.offset(37)):
        Circle(F26_S85_R)
    extrude(amount=F26_T86_DEPTH, both=True, mode=Mode.INTERSECT)

    # F26_s87 → F26_t88 (cut, symmetric)
    with BuildSketch(Plane.XY.offset(37)):
        Circle(F26_S87_R)
    extrude(amount=F26_T88_DEPTH, both=True, mode=Mode.SUBTRACT)


with BuildPart() as f1_14:
    add(f1_13.part)

    # F26_t81: union F26_tool82
    add(f26_tool82.part)


with BuildPart() as f26_tool90:
    # F26_s91 → F26_t92 (new body)
    with BuildSketch(Plane(origin=(0.5174755181, 0.8962938889, 0), x_dir=(0, 0, 1), z_dir=(0.5, 0.8660254038, 0))):
        Polygon((38.5, 0), (35.5, 3), (35.5, 0), align=None)
    extrude(amount=F26_T92_DEPTH)

    # F26_s93 → F26_t94 (intersect, symmetric)
    with BuildSketch(Plane.XY.offset(37)):
        Circle(F26_S93_R)
    extrude(amount=F26_T94_DEPTH, both=True, mode=Mode.INTERSECT)

    # F26_s95 → F26_t96 (cut, symmetric)
    with BuildSketch(Plane.XY.offset(37)):
        Circle(F26_S95_R)
    extrude(amount=F26_T96_DEPTH, both=True, mode=Mode.SUBTRACT)


with BuildPart() as f1_15:
    add(f1_14.part)

    # F26_t89: union F26_tool90
    add(f26_tool90.part)


solid = f1_15.part
